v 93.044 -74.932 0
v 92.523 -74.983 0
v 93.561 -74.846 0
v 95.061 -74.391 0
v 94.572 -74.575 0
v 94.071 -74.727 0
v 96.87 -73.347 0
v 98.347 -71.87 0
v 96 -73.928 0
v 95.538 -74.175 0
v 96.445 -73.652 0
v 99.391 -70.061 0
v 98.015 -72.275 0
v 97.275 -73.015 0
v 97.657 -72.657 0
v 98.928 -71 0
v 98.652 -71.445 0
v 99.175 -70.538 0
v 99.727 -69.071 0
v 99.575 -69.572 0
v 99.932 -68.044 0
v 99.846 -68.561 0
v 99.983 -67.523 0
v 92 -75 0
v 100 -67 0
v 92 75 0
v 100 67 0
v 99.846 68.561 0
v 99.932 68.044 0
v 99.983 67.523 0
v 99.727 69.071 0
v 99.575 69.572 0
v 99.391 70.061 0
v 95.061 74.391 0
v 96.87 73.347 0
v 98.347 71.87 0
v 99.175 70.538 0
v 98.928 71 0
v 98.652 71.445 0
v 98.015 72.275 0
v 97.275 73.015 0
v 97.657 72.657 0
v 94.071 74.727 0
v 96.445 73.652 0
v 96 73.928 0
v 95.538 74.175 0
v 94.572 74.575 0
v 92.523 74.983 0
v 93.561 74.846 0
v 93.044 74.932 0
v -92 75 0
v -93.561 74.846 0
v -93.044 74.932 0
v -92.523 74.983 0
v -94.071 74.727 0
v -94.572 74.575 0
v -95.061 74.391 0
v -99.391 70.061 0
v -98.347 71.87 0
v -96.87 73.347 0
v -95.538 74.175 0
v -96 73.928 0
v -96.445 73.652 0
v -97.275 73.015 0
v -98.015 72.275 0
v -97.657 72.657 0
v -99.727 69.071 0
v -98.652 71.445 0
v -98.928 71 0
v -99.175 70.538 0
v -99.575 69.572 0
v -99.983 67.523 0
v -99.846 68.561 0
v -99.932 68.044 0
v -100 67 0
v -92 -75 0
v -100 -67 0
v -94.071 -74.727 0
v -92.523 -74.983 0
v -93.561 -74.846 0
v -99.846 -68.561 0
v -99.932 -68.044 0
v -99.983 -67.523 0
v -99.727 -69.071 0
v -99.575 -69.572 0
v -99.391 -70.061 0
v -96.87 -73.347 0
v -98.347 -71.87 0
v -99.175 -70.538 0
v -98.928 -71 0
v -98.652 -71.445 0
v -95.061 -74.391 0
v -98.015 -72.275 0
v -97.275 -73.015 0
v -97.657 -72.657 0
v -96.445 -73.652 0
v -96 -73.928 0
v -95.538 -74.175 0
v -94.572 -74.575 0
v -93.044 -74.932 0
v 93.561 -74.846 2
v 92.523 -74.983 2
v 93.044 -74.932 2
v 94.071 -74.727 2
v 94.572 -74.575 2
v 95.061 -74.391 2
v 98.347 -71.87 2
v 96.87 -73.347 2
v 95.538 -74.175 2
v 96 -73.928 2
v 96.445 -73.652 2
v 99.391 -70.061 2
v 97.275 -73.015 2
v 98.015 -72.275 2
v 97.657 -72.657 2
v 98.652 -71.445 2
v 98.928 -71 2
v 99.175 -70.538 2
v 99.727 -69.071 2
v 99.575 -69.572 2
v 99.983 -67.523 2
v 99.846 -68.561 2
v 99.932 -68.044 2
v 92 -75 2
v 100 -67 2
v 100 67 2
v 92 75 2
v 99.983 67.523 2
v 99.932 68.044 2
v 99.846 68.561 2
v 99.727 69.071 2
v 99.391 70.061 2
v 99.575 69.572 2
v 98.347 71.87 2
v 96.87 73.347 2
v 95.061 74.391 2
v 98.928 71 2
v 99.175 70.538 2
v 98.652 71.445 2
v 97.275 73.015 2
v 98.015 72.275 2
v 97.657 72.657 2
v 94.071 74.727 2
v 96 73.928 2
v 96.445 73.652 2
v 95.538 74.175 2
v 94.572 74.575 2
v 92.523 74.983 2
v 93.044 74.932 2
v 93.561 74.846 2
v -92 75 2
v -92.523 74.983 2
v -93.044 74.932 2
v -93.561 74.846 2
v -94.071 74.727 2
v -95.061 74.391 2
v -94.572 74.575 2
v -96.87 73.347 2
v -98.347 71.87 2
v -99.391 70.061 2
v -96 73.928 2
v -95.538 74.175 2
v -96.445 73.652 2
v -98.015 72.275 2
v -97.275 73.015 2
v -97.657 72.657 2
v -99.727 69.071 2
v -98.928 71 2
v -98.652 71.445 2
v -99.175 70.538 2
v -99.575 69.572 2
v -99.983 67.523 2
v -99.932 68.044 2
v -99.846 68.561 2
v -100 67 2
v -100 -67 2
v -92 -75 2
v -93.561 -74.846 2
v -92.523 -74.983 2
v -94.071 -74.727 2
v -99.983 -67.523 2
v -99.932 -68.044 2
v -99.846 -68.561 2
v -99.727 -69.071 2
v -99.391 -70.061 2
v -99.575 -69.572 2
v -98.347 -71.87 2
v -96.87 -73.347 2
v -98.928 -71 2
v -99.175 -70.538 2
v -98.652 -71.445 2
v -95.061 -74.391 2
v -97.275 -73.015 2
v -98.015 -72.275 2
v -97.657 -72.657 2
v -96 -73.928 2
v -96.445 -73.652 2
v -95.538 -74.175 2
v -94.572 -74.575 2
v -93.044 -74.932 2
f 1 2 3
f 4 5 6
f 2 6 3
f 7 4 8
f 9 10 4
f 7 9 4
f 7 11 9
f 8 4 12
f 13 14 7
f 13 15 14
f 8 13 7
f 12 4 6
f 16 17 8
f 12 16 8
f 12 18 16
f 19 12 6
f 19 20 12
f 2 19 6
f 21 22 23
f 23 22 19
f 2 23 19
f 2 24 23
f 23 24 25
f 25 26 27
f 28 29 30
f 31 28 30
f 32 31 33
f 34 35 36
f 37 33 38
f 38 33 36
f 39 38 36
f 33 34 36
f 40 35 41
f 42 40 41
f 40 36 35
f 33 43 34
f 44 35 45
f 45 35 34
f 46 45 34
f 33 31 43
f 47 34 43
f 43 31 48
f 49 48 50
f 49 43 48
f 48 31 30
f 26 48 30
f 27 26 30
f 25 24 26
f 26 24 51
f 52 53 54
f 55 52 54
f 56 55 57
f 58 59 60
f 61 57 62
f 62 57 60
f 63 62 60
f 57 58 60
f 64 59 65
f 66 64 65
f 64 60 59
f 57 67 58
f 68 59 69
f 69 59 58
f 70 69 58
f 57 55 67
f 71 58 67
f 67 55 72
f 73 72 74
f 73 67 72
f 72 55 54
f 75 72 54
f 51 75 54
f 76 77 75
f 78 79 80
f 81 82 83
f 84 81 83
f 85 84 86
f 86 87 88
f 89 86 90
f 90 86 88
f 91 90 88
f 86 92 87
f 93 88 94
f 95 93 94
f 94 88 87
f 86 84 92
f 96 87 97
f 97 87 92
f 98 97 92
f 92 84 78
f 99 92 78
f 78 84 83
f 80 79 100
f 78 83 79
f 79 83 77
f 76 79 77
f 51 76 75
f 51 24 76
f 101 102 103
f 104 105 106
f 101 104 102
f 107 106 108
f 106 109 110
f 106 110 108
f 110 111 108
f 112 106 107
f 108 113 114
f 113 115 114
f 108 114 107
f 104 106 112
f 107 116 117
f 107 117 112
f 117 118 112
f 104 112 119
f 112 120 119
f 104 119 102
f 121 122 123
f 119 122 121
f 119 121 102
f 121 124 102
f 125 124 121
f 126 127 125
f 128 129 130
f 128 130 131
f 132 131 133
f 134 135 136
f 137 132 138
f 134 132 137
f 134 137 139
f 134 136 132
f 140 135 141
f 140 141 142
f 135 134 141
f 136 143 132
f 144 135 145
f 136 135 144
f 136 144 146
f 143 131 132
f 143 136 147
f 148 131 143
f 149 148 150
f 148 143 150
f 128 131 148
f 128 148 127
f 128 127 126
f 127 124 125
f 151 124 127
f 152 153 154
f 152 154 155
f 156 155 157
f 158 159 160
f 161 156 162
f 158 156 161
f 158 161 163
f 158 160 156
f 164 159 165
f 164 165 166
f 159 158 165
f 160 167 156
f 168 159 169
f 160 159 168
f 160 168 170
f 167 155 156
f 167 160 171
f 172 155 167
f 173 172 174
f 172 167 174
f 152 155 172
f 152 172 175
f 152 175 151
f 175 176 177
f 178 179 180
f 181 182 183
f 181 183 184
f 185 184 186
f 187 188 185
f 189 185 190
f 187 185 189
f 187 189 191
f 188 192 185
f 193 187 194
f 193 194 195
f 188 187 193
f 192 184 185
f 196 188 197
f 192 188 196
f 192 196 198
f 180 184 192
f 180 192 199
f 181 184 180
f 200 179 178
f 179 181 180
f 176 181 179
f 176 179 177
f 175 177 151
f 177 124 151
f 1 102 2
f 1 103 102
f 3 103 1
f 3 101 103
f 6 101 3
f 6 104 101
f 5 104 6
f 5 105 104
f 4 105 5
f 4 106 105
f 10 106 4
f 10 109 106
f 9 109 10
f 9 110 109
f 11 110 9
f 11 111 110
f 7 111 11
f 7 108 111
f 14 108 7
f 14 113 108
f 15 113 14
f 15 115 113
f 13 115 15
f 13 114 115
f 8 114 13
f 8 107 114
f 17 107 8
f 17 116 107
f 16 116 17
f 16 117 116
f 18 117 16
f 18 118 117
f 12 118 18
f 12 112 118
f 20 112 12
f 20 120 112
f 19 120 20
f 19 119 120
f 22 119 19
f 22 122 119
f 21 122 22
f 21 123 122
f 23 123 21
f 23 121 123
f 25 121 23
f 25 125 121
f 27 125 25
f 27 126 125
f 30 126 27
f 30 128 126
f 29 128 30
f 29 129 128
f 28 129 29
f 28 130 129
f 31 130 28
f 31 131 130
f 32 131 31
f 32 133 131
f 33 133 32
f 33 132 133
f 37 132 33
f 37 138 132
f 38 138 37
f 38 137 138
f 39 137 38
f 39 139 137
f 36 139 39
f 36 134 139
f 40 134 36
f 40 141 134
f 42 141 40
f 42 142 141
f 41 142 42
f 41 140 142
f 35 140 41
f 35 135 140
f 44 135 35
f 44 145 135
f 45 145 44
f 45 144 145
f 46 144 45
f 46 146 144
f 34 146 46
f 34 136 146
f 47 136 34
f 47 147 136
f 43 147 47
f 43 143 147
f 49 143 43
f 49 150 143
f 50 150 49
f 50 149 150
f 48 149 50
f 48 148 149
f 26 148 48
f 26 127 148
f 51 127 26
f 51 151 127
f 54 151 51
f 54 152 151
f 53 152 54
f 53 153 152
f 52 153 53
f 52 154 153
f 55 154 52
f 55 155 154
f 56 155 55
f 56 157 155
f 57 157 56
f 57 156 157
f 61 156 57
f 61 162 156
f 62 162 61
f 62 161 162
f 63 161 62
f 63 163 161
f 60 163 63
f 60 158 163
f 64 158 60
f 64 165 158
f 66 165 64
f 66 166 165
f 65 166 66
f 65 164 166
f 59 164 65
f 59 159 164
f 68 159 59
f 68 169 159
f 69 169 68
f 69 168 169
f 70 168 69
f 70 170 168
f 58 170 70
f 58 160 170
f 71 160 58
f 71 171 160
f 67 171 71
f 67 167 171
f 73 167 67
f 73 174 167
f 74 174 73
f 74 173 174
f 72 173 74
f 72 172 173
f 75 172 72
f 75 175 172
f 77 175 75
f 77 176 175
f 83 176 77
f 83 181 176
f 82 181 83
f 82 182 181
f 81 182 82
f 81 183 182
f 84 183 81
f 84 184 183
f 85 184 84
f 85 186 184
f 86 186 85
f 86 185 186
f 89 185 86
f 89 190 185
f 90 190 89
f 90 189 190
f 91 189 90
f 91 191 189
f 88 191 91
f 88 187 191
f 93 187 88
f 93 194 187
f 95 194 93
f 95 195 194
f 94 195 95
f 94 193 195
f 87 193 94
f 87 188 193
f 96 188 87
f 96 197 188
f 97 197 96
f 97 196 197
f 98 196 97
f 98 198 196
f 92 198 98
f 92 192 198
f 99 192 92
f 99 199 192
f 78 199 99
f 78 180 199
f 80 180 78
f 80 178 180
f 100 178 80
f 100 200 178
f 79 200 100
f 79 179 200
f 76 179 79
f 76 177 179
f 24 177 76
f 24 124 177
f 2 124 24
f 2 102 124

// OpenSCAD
$fn = 96;

length = 200;
width  = 150;
thickness = 2;

corner_radius = 8;

module rounded_sheet(l, w, t, r){
    r2 = min(r, min(l, w)/2);
    linear_extrude(height = t, center = false)
        offset(r = r2)
            square([l - 2*r2, w - 2*r2], center = true);
}

color([0.85, 0.85, 0.9, 0.35])
translate([0, 0, 0])
rounded_sheet(length, width, thickness, corner_radius);
